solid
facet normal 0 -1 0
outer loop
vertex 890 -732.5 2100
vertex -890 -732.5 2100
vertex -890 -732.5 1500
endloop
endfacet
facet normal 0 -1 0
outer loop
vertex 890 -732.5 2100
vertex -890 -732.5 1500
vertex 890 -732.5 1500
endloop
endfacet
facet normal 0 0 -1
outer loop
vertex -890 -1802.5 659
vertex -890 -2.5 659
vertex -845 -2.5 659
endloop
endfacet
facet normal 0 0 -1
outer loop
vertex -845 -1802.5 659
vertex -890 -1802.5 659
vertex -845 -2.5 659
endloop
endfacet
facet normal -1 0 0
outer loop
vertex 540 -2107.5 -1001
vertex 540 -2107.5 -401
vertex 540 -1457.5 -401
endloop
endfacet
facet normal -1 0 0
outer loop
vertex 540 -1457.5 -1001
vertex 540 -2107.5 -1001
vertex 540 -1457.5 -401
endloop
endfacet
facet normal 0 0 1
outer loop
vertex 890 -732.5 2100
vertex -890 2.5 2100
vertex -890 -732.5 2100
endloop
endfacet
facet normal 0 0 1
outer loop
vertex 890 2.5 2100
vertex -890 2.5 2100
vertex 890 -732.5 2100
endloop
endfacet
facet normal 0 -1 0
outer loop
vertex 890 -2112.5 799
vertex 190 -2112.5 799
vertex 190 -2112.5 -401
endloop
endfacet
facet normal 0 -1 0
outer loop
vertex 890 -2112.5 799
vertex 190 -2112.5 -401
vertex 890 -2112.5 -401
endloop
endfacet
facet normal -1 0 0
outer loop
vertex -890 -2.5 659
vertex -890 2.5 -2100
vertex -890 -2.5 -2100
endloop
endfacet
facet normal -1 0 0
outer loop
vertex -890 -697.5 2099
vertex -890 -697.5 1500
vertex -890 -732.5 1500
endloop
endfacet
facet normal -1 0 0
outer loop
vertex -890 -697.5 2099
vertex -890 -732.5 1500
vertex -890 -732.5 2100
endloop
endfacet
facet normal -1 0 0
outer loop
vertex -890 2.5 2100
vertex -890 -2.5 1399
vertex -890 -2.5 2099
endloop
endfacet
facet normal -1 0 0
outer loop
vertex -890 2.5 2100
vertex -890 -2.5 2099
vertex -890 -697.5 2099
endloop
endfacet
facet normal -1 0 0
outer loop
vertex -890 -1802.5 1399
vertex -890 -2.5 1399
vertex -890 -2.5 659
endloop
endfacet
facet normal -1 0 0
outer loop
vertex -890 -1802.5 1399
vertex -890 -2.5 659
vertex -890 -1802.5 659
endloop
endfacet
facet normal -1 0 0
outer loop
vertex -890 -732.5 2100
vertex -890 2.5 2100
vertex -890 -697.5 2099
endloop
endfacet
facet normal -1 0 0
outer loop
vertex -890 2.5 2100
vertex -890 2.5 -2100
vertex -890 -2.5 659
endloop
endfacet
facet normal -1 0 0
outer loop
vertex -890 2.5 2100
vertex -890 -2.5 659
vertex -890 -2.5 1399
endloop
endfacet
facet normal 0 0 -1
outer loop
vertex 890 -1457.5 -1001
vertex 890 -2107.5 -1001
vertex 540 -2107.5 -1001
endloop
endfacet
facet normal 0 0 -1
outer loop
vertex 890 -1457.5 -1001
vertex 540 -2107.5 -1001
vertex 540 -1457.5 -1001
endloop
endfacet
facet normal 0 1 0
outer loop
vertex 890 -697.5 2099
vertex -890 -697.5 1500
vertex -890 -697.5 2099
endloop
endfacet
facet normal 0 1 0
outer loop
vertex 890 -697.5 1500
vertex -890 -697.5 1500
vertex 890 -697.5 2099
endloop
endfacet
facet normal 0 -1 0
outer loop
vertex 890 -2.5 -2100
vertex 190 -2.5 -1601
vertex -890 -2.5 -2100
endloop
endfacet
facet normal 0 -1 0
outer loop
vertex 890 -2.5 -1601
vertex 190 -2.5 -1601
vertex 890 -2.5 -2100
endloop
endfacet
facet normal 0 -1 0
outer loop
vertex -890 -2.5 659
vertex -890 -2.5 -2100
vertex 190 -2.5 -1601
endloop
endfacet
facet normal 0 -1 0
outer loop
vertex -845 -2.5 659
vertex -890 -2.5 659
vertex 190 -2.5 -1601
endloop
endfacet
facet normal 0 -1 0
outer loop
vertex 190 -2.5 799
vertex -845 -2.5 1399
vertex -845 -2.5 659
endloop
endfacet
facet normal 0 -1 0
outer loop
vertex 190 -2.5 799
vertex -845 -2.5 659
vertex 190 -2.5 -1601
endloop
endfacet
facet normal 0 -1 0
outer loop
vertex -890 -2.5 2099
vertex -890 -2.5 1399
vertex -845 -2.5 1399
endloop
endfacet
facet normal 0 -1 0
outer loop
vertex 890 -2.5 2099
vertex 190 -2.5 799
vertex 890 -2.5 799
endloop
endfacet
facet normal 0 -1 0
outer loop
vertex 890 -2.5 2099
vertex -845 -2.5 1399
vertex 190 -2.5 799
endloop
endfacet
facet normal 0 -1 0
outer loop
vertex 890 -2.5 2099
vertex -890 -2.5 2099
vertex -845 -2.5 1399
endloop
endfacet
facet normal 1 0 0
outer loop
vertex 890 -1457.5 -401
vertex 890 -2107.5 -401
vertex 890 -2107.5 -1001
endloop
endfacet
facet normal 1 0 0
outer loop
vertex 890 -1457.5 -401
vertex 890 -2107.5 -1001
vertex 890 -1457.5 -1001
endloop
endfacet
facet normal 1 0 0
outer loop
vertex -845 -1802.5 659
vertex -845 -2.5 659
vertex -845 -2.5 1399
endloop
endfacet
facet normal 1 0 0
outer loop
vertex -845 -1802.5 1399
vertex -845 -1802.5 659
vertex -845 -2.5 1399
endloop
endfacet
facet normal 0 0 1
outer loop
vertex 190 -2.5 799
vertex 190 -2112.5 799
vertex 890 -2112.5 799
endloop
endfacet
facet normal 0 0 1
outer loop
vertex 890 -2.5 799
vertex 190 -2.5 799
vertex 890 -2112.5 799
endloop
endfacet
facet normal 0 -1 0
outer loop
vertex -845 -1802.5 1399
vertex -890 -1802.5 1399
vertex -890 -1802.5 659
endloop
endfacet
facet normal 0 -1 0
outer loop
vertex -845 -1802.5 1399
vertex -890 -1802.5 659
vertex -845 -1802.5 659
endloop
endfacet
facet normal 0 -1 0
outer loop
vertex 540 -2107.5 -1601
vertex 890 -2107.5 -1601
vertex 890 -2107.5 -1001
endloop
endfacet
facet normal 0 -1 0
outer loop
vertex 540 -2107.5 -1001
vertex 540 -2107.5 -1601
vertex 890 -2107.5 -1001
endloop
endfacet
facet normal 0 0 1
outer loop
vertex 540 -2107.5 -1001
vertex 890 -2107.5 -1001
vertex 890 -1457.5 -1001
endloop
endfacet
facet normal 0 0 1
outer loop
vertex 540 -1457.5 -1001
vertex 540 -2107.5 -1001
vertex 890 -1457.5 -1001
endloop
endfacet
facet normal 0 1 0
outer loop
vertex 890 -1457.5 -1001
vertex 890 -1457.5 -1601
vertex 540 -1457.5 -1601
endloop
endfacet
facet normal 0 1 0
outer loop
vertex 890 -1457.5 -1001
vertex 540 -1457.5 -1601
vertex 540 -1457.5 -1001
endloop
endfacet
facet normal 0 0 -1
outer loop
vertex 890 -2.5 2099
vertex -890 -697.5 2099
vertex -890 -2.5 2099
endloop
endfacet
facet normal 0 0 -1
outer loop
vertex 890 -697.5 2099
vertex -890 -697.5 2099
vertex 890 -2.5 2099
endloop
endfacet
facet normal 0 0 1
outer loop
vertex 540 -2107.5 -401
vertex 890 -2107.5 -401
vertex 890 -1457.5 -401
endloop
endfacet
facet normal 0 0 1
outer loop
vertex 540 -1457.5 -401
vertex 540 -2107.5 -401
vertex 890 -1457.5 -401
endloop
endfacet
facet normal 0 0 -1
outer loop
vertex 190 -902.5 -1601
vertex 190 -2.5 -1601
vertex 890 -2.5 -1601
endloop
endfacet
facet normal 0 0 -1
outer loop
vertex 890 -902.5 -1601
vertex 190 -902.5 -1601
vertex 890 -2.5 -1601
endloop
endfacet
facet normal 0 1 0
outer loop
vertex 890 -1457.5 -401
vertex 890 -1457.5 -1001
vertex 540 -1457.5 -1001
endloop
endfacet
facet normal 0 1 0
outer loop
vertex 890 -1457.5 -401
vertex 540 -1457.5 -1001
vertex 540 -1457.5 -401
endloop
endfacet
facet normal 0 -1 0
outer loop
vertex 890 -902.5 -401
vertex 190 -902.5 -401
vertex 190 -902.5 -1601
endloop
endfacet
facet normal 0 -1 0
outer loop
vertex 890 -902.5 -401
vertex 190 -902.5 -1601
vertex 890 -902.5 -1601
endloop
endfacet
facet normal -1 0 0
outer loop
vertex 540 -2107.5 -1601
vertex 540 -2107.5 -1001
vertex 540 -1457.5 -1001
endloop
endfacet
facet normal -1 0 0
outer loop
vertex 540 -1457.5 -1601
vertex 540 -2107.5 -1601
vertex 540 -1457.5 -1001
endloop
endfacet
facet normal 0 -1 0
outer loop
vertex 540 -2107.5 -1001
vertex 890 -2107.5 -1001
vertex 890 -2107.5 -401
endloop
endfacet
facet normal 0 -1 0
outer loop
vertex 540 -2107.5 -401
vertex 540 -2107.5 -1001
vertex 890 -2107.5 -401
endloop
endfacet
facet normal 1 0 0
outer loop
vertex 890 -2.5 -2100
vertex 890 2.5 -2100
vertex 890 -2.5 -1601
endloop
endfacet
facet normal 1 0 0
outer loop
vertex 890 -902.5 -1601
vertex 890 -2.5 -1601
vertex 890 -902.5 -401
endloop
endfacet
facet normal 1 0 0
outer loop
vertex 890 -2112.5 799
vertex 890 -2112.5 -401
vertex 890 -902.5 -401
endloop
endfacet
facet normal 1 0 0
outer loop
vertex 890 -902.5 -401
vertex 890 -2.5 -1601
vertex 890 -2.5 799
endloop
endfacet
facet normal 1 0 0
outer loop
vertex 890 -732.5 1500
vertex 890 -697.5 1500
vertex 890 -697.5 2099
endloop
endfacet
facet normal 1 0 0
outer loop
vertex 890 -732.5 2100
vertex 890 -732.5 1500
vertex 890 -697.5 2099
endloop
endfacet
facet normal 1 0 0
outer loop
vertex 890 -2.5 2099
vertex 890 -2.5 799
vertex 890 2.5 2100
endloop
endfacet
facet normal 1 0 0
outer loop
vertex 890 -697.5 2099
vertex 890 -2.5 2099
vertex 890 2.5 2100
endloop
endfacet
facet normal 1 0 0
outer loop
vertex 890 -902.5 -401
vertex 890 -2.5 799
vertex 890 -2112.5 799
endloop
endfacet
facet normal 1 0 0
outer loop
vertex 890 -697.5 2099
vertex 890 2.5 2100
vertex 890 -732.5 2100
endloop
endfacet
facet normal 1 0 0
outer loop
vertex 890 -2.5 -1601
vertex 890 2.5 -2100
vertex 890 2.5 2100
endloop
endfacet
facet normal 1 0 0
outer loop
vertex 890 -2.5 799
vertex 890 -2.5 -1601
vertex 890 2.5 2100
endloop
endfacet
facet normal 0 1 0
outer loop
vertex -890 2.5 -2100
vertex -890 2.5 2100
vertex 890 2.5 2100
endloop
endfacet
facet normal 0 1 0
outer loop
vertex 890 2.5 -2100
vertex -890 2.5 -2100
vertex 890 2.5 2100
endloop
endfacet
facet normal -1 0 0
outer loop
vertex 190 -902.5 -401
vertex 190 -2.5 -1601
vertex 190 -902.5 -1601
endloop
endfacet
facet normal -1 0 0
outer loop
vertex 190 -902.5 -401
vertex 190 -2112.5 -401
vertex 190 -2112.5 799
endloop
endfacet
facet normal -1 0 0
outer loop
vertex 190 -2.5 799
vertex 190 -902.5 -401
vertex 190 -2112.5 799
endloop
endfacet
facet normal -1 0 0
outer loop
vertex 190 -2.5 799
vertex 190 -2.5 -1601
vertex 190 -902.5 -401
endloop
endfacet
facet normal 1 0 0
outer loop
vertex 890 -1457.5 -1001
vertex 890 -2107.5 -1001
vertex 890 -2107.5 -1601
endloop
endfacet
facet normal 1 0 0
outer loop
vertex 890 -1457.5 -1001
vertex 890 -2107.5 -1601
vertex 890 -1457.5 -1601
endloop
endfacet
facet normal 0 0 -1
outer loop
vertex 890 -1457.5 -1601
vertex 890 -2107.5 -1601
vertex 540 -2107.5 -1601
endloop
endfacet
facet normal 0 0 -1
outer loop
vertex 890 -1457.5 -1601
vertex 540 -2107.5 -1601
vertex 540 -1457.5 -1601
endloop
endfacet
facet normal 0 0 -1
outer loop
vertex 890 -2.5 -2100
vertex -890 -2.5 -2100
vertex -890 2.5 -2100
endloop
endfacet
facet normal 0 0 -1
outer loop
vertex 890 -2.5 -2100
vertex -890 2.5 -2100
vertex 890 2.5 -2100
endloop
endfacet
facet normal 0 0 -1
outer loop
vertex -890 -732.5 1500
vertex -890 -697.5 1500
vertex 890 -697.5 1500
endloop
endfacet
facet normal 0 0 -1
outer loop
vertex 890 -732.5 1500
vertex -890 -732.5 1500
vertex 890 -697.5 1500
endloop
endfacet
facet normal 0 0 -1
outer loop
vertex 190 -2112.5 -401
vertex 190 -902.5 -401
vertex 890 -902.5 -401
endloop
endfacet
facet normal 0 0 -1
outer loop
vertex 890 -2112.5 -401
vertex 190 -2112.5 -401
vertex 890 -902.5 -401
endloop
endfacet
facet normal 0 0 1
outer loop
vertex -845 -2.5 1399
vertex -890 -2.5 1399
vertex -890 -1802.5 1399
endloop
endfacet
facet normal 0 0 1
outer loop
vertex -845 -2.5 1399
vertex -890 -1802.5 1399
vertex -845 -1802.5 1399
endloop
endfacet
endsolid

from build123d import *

# Parameters (mm, degrees)
F0_W      = 1780
F0_H      = 4200
F1_DEPTH  = 2.5
F2_W      = 1780
F2_H      = 600
F3_DEPTH  = 730
F4_W      = 1780
F4_H      = 695
F5_DEPTH  = 599
F6_W      = 700
F6_H      = 600
F7_DEPTH  = 2110
F8_W      = 700
F8_H      = 600
F9_DEPTH  = 2110
F10_W     = 700
F10_H     = 600
F11_DEPTH = 900
F12_W     = 700
F12_H     = 600
F13_DEPTH = 900
F14_W     = 650
F14_H     = 600
F15_DEPTH = 350
F16_W     = 650
F16_H     = 600
F17_DEPTH = 350
F6_W_2    = 45
F6_H_2    = 740
F18_DEPTH = 1800


with BuildPart() as f1:
    # F0 (on Front) → F1 (new body, symmetric)
    with BuildSketch(Plane.XZ):
        Rectangle(F0_W, F0_H)
    extrude(amount=F1_DEPTH, both=True)

    # F2 (on face) → F3 (join)
    with BuildSketch(Plane.XZ.offset(2.5)):
        with Locations((0, 1800)):
            Rectangle(F2_W, F2_H)
    extrude(amount=F3_DEPTH)

    # F4 (on face) → F5 (cut)
    with BuildSketch(Plane(origin=(0, 0, 1500), x_dir=(1, 0, 0), z_dir=(0, 0, -1))):
        with Locations((0, 350)):
            Rectangle(F4_W, F4_H)
    extrude(amount=-F5_DEPTH, mode=Mode.SUBTRACT)

    # F6 (on face) → F7 (join)
    with BuildSketch(Plane.XZ.offset(2.5)):
        with Locations((540, 499)):
            Rectangle(F6_W, F6_H)
    extrude(amount=F7_DEPTH)

    # F8 (on face) → F9 (join)
    with BuildSketch(Plane.XZ.offset(2.5)):
        with Locations((540, -101)):
            Rectangle(F8_W, F8_H)
    extrude(amount=F9_DEPTH)

    # F10 (on face) → F11 (join)
    with BuildSketch(Plane.XZ.offset(2.5)):
        with Locations((540, -701)):
            Rectangle(F10_W, F10_H)
    extrude(amount=F11_DEPTH)

    # F12 (on face) → F13 (join)
    with BuildSketch(Plane.XZ.offset(2.5)):
        with Locations((540, -1301)):
            Rectangle(F12_W, F12_H)
    extrude(amount=F13_DEPTH)

    # F6 (on face) → F18 (join)
    with BuildSketch(Plane.XZ.offset(2.5)):
        with Locations((-867.5, 1029)):
            Rectangle(F6_W_2, F6_H_2)
    extrude(amount=F18_DEPTH)


with BuildPart() as f15:
    # F14 (on face) → F15 (new body)
    with BuildSketch(Plane.YZ.offset(890)):
        with Locations((-1782.5, -701)):
            Rectangle(F14_W, F14_H)
    extrude(amount=-F15_DEPTH)


with BuildPart() as f17:
    # F16 (on face) → F17 (new body)
    with BuildSketch(Plane.YZ.offset(890)):
        with Locations((-1782.5, -1301)):
            Rectangle(F16_W, F16_H)
    extrude(amount=-F17_DEPTH)


solid = Compound([f1.part, f15.part, f17.part])
